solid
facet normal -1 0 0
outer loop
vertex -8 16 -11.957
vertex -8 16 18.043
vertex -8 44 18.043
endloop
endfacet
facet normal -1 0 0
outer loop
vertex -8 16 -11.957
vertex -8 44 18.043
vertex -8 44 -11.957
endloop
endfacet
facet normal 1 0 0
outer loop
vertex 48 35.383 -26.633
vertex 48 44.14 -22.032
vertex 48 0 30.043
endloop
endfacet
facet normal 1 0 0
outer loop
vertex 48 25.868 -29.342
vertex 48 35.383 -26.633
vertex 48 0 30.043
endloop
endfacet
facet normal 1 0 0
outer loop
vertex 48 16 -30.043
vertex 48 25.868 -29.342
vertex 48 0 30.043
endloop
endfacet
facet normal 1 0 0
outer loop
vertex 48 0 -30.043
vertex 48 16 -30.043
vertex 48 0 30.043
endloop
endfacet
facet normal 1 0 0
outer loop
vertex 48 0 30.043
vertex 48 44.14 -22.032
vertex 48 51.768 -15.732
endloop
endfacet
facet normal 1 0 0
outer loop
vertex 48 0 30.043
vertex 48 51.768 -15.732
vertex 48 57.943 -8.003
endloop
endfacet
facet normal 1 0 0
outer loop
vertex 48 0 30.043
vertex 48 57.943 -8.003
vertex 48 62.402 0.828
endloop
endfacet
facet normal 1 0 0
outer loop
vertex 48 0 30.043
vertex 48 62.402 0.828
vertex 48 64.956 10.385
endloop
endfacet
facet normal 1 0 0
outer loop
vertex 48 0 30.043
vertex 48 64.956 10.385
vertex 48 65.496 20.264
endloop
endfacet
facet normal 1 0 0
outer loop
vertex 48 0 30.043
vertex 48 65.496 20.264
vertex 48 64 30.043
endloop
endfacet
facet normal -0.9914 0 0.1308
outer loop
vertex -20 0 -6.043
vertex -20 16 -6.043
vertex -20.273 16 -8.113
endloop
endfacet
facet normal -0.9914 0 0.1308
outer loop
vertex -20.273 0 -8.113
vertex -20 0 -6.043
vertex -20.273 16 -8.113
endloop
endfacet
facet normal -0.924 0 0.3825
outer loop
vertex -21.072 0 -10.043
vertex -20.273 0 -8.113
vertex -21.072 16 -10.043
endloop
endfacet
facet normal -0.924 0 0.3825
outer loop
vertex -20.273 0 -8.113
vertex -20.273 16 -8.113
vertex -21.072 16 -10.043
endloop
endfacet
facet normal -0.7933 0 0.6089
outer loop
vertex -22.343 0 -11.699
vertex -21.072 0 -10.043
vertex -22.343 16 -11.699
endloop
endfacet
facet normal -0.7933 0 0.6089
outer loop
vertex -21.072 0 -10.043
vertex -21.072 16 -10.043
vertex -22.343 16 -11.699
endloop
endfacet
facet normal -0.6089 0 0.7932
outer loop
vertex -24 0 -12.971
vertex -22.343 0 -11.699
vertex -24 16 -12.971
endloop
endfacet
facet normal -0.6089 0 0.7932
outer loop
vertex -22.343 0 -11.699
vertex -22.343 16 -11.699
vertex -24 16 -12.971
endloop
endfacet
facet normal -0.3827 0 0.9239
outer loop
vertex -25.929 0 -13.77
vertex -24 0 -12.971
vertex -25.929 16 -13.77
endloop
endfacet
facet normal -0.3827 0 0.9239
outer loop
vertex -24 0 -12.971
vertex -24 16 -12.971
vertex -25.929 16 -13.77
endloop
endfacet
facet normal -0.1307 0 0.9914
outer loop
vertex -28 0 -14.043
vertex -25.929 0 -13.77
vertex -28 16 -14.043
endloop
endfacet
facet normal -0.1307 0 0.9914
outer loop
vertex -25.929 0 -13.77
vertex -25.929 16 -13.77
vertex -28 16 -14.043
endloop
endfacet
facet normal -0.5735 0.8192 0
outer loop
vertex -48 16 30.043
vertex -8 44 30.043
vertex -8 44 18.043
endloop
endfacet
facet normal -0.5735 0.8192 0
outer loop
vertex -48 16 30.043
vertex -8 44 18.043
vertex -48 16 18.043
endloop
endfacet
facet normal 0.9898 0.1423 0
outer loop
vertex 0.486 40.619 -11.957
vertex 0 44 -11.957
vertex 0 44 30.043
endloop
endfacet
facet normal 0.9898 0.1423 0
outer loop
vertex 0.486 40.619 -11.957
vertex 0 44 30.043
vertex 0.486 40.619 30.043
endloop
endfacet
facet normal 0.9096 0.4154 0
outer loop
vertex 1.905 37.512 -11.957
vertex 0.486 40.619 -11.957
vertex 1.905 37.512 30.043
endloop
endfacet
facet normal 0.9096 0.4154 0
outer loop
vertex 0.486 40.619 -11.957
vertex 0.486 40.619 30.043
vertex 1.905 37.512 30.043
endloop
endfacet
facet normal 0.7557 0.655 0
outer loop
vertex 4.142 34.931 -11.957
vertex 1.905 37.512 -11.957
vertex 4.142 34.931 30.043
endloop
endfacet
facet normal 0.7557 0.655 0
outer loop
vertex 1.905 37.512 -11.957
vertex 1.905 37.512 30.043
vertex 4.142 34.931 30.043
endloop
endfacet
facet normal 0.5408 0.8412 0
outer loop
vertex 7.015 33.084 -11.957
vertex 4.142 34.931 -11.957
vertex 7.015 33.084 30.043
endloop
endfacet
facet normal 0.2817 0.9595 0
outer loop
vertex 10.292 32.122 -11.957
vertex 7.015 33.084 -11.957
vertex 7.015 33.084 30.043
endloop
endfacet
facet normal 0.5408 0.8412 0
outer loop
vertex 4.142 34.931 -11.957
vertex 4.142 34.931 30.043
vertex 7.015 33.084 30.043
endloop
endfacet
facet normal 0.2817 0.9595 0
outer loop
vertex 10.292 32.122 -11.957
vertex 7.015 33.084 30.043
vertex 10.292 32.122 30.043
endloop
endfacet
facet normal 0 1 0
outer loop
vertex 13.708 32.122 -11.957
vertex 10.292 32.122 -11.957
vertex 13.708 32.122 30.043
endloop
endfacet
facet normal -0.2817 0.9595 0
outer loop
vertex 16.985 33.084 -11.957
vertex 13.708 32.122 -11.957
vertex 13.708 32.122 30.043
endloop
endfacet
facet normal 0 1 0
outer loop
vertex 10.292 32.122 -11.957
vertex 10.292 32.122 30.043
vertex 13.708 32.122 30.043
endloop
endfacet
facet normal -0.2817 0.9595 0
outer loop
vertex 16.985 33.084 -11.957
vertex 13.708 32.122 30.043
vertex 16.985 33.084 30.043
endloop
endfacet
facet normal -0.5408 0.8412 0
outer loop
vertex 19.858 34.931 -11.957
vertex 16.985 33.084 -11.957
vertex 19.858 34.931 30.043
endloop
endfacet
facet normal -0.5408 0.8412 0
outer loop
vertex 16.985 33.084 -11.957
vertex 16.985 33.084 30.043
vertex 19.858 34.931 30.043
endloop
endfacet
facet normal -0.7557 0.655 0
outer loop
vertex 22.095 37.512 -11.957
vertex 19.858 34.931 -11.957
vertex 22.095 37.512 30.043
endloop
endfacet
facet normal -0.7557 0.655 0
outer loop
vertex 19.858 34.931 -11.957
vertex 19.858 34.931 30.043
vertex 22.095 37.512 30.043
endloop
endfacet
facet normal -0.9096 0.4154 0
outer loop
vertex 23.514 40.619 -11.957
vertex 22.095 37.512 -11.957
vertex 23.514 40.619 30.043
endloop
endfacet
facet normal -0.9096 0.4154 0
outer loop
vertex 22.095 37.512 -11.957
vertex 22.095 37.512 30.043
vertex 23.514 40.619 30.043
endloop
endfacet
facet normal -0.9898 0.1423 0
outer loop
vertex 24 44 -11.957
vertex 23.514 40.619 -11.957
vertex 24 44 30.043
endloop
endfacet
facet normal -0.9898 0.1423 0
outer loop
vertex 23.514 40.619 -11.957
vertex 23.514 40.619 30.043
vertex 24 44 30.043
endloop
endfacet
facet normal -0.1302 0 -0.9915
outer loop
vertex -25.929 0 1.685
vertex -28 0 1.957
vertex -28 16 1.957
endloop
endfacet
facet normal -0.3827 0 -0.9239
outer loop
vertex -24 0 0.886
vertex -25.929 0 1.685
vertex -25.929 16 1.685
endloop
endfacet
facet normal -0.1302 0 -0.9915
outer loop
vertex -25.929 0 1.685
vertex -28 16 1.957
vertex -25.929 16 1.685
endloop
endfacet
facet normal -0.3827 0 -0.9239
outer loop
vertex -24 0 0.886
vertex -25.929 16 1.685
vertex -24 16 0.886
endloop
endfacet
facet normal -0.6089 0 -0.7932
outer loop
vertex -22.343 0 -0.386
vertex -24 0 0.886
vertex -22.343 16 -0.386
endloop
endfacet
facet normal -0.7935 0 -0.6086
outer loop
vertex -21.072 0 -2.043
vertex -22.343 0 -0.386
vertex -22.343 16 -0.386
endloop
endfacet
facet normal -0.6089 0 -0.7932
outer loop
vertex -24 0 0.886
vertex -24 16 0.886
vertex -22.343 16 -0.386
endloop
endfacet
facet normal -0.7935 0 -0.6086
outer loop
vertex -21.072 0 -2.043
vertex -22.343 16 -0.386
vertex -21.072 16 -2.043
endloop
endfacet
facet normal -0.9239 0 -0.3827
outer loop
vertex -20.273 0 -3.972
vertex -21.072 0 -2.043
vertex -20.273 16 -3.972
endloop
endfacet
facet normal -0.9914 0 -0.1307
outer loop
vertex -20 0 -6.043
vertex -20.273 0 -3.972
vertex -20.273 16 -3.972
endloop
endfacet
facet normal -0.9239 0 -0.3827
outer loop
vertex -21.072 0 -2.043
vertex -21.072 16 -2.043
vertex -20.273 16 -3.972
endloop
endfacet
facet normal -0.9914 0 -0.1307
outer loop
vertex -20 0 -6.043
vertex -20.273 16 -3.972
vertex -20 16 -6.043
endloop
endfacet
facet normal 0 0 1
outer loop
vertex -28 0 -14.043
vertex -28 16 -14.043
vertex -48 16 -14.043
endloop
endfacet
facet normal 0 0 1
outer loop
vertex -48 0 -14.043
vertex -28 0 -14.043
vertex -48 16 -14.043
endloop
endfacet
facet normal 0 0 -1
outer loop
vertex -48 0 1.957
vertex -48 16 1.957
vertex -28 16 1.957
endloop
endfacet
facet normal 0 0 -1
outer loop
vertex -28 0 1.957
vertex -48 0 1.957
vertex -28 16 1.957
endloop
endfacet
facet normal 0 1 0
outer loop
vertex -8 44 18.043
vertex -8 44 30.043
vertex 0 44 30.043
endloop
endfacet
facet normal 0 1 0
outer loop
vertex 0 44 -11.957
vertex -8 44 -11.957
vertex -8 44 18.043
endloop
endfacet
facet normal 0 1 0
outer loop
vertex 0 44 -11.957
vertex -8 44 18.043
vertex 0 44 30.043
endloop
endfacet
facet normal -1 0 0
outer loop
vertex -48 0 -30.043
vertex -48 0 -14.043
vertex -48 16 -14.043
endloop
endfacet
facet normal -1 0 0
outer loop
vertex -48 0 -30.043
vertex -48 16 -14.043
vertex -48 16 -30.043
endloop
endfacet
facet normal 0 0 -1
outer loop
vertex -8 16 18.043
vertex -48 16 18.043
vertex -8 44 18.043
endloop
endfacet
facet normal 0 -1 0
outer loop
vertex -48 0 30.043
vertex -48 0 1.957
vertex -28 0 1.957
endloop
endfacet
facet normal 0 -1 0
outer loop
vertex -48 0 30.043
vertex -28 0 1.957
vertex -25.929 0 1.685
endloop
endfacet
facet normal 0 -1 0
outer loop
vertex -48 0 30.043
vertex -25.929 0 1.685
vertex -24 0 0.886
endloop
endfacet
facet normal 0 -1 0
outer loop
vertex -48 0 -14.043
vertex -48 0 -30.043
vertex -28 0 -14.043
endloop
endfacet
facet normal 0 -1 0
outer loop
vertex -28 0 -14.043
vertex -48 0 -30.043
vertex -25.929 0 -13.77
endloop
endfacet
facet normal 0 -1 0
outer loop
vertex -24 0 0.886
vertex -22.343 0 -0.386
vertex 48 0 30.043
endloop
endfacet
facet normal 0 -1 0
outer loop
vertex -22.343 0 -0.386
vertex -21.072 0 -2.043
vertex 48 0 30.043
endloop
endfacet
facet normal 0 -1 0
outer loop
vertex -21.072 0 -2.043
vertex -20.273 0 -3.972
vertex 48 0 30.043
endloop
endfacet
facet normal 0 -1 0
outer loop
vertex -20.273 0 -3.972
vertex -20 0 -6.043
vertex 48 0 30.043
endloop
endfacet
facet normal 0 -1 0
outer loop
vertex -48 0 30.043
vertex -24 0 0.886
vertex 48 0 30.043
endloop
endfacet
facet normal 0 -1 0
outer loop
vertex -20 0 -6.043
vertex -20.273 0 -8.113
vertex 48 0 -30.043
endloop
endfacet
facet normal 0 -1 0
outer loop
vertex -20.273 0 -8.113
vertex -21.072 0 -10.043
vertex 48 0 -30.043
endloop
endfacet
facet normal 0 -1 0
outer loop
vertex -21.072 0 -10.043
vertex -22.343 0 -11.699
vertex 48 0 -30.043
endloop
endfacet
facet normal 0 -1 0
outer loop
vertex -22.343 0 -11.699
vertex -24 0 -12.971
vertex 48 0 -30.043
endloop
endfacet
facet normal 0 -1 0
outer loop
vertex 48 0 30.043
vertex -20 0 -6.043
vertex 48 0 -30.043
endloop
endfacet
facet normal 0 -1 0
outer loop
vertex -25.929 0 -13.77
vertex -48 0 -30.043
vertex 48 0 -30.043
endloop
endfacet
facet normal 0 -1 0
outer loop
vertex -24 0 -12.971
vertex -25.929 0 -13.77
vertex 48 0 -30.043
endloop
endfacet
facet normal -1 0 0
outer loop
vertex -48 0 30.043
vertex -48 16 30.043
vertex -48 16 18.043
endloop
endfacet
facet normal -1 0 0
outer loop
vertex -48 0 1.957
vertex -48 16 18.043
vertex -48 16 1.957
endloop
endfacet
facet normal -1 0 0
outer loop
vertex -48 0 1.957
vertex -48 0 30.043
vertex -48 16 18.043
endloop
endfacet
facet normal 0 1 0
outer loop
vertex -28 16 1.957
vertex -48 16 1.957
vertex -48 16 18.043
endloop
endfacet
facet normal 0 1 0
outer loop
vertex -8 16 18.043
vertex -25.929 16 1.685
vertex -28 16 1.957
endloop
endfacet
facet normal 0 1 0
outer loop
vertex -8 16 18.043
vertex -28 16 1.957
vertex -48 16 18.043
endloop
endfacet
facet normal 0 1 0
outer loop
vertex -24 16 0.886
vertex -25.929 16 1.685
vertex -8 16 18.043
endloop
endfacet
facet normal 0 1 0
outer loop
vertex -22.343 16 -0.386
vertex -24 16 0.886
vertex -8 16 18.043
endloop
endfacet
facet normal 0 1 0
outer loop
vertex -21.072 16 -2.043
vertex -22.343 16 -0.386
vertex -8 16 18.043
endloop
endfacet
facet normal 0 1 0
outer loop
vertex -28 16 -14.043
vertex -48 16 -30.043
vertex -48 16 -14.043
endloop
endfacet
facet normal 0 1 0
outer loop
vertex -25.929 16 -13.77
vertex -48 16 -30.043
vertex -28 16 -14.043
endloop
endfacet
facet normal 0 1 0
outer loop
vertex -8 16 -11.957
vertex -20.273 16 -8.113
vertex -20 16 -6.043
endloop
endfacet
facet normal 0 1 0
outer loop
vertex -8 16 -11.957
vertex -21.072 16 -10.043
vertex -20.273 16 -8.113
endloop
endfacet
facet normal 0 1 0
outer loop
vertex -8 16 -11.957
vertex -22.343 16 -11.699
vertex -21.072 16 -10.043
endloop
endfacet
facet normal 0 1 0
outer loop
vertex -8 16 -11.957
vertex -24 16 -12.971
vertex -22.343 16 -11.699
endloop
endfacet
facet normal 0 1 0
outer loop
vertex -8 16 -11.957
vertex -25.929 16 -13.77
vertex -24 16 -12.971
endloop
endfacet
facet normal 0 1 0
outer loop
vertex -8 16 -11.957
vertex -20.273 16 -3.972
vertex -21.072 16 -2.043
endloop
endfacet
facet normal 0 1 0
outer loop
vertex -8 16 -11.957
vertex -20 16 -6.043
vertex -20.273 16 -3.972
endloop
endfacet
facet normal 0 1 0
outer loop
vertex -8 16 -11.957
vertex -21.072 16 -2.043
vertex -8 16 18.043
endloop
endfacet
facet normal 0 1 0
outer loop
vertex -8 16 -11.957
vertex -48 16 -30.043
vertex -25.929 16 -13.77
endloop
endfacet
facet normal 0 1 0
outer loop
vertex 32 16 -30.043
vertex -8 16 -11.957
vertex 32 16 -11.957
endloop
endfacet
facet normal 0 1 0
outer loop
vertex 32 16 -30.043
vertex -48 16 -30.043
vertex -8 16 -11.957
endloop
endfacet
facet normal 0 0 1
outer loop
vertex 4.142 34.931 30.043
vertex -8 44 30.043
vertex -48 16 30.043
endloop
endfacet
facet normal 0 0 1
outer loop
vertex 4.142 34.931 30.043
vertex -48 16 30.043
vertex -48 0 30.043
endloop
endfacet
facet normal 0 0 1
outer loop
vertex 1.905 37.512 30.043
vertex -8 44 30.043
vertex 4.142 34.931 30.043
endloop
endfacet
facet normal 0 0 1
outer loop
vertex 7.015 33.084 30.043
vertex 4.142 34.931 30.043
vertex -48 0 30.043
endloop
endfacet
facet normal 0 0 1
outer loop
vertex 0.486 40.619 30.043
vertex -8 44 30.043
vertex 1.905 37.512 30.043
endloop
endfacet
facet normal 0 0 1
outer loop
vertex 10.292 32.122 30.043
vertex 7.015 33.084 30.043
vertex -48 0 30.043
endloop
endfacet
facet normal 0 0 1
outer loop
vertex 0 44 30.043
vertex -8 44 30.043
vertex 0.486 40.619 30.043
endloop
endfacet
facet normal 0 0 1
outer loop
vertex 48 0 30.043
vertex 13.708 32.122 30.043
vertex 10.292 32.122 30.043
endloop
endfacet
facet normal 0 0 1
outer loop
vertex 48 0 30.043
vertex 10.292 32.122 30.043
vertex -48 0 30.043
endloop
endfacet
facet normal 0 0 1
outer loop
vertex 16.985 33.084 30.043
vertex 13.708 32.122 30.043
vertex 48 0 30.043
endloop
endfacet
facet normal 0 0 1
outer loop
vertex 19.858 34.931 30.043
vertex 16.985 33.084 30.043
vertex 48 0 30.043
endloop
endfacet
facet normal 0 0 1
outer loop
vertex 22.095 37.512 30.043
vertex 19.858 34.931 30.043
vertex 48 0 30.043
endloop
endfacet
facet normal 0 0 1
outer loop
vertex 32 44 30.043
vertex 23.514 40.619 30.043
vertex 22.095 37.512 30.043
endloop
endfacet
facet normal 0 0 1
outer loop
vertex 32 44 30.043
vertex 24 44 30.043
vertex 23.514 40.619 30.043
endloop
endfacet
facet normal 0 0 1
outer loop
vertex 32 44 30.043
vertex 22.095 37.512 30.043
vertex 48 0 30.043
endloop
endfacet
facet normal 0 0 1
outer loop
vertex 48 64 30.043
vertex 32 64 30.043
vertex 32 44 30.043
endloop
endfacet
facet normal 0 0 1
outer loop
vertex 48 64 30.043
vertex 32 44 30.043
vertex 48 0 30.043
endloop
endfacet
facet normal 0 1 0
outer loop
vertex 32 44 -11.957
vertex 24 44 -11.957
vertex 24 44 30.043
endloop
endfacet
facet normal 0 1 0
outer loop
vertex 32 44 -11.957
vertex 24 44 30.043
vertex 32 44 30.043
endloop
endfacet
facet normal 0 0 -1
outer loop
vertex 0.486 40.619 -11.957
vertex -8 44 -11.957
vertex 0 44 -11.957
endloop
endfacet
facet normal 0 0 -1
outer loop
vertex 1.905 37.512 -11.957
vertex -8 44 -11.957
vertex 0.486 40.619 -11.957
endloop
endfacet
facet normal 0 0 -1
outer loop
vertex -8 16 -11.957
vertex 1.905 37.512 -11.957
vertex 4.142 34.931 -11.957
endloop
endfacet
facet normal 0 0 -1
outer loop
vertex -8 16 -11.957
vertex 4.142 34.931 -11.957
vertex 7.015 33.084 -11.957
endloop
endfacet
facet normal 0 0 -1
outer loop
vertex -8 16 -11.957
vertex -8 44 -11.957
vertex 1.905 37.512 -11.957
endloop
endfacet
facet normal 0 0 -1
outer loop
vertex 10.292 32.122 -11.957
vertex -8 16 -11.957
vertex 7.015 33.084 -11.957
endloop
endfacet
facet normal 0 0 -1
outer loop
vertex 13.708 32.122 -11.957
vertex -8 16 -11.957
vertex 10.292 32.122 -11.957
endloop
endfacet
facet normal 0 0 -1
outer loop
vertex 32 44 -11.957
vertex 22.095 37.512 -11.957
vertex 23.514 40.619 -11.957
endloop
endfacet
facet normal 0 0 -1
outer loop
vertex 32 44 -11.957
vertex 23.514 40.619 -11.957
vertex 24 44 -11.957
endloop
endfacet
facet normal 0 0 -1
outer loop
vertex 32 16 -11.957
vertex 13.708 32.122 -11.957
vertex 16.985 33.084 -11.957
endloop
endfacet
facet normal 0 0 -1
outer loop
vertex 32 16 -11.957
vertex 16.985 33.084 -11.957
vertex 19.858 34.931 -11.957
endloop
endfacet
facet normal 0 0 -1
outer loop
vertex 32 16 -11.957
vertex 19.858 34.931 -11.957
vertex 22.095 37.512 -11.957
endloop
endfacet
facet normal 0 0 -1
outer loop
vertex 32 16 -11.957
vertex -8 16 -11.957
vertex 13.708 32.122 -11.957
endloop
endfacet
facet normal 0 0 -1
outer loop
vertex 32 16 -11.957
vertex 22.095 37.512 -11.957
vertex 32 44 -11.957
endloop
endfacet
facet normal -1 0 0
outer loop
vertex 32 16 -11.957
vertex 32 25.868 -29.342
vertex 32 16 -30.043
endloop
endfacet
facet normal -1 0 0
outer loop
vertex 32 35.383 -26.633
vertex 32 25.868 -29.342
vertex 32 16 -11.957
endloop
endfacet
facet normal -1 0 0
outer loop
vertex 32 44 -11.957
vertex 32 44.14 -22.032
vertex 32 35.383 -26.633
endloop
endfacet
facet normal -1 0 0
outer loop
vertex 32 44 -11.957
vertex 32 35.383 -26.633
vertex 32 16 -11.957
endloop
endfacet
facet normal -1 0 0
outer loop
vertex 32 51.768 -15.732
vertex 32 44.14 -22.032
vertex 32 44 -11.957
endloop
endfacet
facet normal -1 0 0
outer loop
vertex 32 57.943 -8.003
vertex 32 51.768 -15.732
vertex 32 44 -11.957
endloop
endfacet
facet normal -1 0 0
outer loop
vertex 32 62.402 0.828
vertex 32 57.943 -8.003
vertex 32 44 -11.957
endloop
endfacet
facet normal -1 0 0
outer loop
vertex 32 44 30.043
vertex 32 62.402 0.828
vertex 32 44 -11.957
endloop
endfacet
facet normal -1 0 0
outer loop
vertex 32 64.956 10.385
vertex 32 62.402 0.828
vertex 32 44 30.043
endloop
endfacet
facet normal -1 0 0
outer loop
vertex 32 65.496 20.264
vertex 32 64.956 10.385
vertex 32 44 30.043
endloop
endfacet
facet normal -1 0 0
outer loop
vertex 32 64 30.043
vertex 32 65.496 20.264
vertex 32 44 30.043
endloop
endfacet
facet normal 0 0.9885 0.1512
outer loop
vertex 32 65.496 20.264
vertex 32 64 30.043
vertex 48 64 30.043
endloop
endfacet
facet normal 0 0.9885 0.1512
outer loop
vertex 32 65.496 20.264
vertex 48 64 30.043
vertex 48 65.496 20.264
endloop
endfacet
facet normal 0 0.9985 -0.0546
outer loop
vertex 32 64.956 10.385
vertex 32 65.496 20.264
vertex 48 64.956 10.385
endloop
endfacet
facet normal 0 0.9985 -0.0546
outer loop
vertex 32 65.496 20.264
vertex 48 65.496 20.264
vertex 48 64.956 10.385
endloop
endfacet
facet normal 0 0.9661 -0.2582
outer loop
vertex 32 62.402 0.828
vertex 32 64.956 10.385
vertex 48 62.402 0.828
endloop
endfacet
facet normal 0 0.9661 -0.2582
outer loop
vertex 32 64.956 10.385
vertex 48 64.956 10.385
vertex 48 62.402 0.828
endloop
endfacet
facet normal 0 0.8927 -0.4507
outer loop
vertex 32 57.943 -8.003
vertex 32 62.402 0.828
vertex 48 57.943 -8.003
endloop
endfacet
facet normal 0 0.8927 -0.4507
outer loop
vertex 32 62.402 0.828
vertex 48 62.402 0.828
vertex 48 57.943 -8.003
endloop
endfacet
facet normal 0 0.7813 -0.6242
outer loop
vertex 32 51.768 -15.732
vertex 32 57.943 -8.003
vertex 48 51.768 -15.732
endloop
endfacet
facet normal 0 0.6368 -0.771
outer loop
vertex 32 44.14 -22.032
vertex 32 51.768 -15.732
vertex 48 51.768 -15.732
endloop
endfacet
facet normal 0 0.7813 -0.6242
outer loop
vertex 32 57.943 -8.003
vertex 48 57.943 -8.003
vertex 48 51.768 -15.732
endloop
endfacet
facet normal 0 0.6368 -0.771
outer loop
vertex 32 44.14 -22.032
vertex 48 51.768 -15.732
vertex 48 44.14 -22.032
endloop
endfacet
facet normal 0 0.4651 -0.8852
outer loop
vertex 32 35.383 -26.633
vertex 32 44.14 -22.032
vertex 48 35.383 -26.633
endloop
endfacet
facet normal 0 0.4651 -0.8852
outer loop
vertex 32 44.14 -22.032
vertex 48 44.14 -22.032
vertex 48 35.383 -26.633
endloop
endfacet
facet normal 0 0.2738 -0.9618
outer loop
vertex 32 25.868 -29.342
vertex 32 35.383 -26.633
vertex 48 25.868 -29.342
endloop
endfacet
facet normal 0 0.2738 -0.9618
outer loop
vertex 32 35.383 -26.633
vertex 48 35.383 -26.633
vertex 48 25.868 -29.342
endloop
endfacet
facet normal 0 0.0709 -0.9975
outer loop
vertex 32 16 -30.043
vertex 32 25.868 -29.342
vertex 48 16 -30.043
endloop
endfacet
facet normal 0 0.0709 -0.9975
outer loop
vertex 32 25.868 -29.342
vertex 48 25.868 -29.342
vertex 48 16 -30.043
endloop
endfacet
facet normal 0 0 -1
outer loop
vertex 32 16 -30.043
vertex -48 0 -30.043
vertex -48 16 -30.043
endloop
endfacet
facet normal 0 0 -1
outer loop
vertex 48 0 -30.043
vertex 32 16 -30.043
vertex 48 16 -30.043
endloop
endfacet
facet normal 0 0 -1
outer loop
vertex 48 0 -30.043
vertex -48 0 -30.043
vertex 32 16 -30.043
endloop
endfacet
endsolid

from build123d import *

# Parameters (mm, degrees)
SKETCH1_W           = 96
SKETCH1_H           = 60.085106382
BOSS_EXTRUDE2_DEPTH = 16
BOSS_EXTRUDE3_DEPTH = 16
SKETCH5_W           = 40
SKETCH5_H           = 42
BOSS_EXTRUDE4_DEPTH = 28
SKETCH6_R           = 12
CUT_EXTRUDE1_DEPTH  = 43
BOSS_EXTRUDE6_DEPTH = 12
CUT_EXTRUDE2_DEPTH  = 16


with BuildPart() as part:
    # Sketch1 → Boss-Extrude2 (new body)
    with BuildSketch(Plane(origin=(0, 0, 0), x_dir=(1, 0, 0), z_dir=(0, 1, 0))):
        Rectangle(SKETCH1_W, SKETCH1_H)
    extrude(amount=BOSS_EXTRUDE2_DEPTH)

    # Sketch4 → Boss-Extrude3 (add)
    with BuildSketch(Plane(origin=(48, 0, 0), x_dir=(0, 0, -1), z_dir=(1, 0, 0))):
        with BuildLine():
            Line((-30.042553191, 16), (-30.042553191, 64))
            ThreePointArc((-30.042553191, 64), (12.027119449, 55.055223992), (30.042553191, 16))
            Line((30.042553191, 16), (30.042553191, 0))
            Line((30.042553191, 0), (-30.042553191, 0))
            Line((-30.042553191, 0), (-30.042553191, 16))
        make_face()
    extrude(amount=-BOSS_EXTRUDE3_DEPTH)

    # Sketch5 → Boss-Extrude4 (add)
    with BuildSketch(Plane(origin=(0, 16, 0), x_dir=(1, 0, 0), z_dir=(0, 1, 0))):
        with Locations((12, -9.042553191)):
            Rectangle(SKETCH5_W, SKETCH5_H)
    extrude(amount=BOSS_EXTRUDE4_DEPTH)

    # Sketch6 → Cut-Extrude1 (cut)
    with BuildSketch(Plane.XY.offset(30.042553191)):
        with Locations((12, 44)):
            Circle(SKETCH6_R)
    extrude(amount=-CUT_EXTRUDE1_DEPTH, mode=Mode.SUBTRACT)

    # Sketch10 → Boss-Extrude6 (add)
    with BuildSketch(Plane.XY.offset(30.042553191)):
        Polygon((-8, 44), (-48, 16), (-8, 16), align=None)
    extrude(amount=-BOSS_EXTRUDE6_DEPTH)

    # Sketch11 → Cut-Extrude2 (cut)
    with BuildSketch(Plane(origin=(0, 16, 0), x_dir=(1, 0, 0), z_dir=(0, 1, 0))):
        with BuildLine():
            Line((-28, 14.042553191), (-48, 14.042553191))
            Line((-48, 14.042553191), (-48, -1.957446809))
            Line((-48, -1.957446809), (-28, -1.957446809))
            ThreePointArc((-28, -1.957446809), (-36, 6.042553191), (-28, 14.042553191))
        make_face()
        with BuildLine():
            ThreePointArc((-20, 6.042553191), (-22.343145751, 11.699407441), (-28, 14.042553191))
            Line((-28, 14.042553191), (-28, -1.957446809))
            ThreePointArc((-28, -1.957446809), (-22.343145751, 0.385698942), (-20, 6.042553191))
        make_face()
        with BuildLine():
            Line((-28, -1.957446809), (-28, 14.042553191))
            ThreePointArc((-28, 14.042553191), (-36, 6.042553191), (-28, -1.957446809))
        make_face()
    extrude(amount=-CUT_EXTRUDE2_DEPTH, mode=Mode.SUBTRACT)


solid = part.part
